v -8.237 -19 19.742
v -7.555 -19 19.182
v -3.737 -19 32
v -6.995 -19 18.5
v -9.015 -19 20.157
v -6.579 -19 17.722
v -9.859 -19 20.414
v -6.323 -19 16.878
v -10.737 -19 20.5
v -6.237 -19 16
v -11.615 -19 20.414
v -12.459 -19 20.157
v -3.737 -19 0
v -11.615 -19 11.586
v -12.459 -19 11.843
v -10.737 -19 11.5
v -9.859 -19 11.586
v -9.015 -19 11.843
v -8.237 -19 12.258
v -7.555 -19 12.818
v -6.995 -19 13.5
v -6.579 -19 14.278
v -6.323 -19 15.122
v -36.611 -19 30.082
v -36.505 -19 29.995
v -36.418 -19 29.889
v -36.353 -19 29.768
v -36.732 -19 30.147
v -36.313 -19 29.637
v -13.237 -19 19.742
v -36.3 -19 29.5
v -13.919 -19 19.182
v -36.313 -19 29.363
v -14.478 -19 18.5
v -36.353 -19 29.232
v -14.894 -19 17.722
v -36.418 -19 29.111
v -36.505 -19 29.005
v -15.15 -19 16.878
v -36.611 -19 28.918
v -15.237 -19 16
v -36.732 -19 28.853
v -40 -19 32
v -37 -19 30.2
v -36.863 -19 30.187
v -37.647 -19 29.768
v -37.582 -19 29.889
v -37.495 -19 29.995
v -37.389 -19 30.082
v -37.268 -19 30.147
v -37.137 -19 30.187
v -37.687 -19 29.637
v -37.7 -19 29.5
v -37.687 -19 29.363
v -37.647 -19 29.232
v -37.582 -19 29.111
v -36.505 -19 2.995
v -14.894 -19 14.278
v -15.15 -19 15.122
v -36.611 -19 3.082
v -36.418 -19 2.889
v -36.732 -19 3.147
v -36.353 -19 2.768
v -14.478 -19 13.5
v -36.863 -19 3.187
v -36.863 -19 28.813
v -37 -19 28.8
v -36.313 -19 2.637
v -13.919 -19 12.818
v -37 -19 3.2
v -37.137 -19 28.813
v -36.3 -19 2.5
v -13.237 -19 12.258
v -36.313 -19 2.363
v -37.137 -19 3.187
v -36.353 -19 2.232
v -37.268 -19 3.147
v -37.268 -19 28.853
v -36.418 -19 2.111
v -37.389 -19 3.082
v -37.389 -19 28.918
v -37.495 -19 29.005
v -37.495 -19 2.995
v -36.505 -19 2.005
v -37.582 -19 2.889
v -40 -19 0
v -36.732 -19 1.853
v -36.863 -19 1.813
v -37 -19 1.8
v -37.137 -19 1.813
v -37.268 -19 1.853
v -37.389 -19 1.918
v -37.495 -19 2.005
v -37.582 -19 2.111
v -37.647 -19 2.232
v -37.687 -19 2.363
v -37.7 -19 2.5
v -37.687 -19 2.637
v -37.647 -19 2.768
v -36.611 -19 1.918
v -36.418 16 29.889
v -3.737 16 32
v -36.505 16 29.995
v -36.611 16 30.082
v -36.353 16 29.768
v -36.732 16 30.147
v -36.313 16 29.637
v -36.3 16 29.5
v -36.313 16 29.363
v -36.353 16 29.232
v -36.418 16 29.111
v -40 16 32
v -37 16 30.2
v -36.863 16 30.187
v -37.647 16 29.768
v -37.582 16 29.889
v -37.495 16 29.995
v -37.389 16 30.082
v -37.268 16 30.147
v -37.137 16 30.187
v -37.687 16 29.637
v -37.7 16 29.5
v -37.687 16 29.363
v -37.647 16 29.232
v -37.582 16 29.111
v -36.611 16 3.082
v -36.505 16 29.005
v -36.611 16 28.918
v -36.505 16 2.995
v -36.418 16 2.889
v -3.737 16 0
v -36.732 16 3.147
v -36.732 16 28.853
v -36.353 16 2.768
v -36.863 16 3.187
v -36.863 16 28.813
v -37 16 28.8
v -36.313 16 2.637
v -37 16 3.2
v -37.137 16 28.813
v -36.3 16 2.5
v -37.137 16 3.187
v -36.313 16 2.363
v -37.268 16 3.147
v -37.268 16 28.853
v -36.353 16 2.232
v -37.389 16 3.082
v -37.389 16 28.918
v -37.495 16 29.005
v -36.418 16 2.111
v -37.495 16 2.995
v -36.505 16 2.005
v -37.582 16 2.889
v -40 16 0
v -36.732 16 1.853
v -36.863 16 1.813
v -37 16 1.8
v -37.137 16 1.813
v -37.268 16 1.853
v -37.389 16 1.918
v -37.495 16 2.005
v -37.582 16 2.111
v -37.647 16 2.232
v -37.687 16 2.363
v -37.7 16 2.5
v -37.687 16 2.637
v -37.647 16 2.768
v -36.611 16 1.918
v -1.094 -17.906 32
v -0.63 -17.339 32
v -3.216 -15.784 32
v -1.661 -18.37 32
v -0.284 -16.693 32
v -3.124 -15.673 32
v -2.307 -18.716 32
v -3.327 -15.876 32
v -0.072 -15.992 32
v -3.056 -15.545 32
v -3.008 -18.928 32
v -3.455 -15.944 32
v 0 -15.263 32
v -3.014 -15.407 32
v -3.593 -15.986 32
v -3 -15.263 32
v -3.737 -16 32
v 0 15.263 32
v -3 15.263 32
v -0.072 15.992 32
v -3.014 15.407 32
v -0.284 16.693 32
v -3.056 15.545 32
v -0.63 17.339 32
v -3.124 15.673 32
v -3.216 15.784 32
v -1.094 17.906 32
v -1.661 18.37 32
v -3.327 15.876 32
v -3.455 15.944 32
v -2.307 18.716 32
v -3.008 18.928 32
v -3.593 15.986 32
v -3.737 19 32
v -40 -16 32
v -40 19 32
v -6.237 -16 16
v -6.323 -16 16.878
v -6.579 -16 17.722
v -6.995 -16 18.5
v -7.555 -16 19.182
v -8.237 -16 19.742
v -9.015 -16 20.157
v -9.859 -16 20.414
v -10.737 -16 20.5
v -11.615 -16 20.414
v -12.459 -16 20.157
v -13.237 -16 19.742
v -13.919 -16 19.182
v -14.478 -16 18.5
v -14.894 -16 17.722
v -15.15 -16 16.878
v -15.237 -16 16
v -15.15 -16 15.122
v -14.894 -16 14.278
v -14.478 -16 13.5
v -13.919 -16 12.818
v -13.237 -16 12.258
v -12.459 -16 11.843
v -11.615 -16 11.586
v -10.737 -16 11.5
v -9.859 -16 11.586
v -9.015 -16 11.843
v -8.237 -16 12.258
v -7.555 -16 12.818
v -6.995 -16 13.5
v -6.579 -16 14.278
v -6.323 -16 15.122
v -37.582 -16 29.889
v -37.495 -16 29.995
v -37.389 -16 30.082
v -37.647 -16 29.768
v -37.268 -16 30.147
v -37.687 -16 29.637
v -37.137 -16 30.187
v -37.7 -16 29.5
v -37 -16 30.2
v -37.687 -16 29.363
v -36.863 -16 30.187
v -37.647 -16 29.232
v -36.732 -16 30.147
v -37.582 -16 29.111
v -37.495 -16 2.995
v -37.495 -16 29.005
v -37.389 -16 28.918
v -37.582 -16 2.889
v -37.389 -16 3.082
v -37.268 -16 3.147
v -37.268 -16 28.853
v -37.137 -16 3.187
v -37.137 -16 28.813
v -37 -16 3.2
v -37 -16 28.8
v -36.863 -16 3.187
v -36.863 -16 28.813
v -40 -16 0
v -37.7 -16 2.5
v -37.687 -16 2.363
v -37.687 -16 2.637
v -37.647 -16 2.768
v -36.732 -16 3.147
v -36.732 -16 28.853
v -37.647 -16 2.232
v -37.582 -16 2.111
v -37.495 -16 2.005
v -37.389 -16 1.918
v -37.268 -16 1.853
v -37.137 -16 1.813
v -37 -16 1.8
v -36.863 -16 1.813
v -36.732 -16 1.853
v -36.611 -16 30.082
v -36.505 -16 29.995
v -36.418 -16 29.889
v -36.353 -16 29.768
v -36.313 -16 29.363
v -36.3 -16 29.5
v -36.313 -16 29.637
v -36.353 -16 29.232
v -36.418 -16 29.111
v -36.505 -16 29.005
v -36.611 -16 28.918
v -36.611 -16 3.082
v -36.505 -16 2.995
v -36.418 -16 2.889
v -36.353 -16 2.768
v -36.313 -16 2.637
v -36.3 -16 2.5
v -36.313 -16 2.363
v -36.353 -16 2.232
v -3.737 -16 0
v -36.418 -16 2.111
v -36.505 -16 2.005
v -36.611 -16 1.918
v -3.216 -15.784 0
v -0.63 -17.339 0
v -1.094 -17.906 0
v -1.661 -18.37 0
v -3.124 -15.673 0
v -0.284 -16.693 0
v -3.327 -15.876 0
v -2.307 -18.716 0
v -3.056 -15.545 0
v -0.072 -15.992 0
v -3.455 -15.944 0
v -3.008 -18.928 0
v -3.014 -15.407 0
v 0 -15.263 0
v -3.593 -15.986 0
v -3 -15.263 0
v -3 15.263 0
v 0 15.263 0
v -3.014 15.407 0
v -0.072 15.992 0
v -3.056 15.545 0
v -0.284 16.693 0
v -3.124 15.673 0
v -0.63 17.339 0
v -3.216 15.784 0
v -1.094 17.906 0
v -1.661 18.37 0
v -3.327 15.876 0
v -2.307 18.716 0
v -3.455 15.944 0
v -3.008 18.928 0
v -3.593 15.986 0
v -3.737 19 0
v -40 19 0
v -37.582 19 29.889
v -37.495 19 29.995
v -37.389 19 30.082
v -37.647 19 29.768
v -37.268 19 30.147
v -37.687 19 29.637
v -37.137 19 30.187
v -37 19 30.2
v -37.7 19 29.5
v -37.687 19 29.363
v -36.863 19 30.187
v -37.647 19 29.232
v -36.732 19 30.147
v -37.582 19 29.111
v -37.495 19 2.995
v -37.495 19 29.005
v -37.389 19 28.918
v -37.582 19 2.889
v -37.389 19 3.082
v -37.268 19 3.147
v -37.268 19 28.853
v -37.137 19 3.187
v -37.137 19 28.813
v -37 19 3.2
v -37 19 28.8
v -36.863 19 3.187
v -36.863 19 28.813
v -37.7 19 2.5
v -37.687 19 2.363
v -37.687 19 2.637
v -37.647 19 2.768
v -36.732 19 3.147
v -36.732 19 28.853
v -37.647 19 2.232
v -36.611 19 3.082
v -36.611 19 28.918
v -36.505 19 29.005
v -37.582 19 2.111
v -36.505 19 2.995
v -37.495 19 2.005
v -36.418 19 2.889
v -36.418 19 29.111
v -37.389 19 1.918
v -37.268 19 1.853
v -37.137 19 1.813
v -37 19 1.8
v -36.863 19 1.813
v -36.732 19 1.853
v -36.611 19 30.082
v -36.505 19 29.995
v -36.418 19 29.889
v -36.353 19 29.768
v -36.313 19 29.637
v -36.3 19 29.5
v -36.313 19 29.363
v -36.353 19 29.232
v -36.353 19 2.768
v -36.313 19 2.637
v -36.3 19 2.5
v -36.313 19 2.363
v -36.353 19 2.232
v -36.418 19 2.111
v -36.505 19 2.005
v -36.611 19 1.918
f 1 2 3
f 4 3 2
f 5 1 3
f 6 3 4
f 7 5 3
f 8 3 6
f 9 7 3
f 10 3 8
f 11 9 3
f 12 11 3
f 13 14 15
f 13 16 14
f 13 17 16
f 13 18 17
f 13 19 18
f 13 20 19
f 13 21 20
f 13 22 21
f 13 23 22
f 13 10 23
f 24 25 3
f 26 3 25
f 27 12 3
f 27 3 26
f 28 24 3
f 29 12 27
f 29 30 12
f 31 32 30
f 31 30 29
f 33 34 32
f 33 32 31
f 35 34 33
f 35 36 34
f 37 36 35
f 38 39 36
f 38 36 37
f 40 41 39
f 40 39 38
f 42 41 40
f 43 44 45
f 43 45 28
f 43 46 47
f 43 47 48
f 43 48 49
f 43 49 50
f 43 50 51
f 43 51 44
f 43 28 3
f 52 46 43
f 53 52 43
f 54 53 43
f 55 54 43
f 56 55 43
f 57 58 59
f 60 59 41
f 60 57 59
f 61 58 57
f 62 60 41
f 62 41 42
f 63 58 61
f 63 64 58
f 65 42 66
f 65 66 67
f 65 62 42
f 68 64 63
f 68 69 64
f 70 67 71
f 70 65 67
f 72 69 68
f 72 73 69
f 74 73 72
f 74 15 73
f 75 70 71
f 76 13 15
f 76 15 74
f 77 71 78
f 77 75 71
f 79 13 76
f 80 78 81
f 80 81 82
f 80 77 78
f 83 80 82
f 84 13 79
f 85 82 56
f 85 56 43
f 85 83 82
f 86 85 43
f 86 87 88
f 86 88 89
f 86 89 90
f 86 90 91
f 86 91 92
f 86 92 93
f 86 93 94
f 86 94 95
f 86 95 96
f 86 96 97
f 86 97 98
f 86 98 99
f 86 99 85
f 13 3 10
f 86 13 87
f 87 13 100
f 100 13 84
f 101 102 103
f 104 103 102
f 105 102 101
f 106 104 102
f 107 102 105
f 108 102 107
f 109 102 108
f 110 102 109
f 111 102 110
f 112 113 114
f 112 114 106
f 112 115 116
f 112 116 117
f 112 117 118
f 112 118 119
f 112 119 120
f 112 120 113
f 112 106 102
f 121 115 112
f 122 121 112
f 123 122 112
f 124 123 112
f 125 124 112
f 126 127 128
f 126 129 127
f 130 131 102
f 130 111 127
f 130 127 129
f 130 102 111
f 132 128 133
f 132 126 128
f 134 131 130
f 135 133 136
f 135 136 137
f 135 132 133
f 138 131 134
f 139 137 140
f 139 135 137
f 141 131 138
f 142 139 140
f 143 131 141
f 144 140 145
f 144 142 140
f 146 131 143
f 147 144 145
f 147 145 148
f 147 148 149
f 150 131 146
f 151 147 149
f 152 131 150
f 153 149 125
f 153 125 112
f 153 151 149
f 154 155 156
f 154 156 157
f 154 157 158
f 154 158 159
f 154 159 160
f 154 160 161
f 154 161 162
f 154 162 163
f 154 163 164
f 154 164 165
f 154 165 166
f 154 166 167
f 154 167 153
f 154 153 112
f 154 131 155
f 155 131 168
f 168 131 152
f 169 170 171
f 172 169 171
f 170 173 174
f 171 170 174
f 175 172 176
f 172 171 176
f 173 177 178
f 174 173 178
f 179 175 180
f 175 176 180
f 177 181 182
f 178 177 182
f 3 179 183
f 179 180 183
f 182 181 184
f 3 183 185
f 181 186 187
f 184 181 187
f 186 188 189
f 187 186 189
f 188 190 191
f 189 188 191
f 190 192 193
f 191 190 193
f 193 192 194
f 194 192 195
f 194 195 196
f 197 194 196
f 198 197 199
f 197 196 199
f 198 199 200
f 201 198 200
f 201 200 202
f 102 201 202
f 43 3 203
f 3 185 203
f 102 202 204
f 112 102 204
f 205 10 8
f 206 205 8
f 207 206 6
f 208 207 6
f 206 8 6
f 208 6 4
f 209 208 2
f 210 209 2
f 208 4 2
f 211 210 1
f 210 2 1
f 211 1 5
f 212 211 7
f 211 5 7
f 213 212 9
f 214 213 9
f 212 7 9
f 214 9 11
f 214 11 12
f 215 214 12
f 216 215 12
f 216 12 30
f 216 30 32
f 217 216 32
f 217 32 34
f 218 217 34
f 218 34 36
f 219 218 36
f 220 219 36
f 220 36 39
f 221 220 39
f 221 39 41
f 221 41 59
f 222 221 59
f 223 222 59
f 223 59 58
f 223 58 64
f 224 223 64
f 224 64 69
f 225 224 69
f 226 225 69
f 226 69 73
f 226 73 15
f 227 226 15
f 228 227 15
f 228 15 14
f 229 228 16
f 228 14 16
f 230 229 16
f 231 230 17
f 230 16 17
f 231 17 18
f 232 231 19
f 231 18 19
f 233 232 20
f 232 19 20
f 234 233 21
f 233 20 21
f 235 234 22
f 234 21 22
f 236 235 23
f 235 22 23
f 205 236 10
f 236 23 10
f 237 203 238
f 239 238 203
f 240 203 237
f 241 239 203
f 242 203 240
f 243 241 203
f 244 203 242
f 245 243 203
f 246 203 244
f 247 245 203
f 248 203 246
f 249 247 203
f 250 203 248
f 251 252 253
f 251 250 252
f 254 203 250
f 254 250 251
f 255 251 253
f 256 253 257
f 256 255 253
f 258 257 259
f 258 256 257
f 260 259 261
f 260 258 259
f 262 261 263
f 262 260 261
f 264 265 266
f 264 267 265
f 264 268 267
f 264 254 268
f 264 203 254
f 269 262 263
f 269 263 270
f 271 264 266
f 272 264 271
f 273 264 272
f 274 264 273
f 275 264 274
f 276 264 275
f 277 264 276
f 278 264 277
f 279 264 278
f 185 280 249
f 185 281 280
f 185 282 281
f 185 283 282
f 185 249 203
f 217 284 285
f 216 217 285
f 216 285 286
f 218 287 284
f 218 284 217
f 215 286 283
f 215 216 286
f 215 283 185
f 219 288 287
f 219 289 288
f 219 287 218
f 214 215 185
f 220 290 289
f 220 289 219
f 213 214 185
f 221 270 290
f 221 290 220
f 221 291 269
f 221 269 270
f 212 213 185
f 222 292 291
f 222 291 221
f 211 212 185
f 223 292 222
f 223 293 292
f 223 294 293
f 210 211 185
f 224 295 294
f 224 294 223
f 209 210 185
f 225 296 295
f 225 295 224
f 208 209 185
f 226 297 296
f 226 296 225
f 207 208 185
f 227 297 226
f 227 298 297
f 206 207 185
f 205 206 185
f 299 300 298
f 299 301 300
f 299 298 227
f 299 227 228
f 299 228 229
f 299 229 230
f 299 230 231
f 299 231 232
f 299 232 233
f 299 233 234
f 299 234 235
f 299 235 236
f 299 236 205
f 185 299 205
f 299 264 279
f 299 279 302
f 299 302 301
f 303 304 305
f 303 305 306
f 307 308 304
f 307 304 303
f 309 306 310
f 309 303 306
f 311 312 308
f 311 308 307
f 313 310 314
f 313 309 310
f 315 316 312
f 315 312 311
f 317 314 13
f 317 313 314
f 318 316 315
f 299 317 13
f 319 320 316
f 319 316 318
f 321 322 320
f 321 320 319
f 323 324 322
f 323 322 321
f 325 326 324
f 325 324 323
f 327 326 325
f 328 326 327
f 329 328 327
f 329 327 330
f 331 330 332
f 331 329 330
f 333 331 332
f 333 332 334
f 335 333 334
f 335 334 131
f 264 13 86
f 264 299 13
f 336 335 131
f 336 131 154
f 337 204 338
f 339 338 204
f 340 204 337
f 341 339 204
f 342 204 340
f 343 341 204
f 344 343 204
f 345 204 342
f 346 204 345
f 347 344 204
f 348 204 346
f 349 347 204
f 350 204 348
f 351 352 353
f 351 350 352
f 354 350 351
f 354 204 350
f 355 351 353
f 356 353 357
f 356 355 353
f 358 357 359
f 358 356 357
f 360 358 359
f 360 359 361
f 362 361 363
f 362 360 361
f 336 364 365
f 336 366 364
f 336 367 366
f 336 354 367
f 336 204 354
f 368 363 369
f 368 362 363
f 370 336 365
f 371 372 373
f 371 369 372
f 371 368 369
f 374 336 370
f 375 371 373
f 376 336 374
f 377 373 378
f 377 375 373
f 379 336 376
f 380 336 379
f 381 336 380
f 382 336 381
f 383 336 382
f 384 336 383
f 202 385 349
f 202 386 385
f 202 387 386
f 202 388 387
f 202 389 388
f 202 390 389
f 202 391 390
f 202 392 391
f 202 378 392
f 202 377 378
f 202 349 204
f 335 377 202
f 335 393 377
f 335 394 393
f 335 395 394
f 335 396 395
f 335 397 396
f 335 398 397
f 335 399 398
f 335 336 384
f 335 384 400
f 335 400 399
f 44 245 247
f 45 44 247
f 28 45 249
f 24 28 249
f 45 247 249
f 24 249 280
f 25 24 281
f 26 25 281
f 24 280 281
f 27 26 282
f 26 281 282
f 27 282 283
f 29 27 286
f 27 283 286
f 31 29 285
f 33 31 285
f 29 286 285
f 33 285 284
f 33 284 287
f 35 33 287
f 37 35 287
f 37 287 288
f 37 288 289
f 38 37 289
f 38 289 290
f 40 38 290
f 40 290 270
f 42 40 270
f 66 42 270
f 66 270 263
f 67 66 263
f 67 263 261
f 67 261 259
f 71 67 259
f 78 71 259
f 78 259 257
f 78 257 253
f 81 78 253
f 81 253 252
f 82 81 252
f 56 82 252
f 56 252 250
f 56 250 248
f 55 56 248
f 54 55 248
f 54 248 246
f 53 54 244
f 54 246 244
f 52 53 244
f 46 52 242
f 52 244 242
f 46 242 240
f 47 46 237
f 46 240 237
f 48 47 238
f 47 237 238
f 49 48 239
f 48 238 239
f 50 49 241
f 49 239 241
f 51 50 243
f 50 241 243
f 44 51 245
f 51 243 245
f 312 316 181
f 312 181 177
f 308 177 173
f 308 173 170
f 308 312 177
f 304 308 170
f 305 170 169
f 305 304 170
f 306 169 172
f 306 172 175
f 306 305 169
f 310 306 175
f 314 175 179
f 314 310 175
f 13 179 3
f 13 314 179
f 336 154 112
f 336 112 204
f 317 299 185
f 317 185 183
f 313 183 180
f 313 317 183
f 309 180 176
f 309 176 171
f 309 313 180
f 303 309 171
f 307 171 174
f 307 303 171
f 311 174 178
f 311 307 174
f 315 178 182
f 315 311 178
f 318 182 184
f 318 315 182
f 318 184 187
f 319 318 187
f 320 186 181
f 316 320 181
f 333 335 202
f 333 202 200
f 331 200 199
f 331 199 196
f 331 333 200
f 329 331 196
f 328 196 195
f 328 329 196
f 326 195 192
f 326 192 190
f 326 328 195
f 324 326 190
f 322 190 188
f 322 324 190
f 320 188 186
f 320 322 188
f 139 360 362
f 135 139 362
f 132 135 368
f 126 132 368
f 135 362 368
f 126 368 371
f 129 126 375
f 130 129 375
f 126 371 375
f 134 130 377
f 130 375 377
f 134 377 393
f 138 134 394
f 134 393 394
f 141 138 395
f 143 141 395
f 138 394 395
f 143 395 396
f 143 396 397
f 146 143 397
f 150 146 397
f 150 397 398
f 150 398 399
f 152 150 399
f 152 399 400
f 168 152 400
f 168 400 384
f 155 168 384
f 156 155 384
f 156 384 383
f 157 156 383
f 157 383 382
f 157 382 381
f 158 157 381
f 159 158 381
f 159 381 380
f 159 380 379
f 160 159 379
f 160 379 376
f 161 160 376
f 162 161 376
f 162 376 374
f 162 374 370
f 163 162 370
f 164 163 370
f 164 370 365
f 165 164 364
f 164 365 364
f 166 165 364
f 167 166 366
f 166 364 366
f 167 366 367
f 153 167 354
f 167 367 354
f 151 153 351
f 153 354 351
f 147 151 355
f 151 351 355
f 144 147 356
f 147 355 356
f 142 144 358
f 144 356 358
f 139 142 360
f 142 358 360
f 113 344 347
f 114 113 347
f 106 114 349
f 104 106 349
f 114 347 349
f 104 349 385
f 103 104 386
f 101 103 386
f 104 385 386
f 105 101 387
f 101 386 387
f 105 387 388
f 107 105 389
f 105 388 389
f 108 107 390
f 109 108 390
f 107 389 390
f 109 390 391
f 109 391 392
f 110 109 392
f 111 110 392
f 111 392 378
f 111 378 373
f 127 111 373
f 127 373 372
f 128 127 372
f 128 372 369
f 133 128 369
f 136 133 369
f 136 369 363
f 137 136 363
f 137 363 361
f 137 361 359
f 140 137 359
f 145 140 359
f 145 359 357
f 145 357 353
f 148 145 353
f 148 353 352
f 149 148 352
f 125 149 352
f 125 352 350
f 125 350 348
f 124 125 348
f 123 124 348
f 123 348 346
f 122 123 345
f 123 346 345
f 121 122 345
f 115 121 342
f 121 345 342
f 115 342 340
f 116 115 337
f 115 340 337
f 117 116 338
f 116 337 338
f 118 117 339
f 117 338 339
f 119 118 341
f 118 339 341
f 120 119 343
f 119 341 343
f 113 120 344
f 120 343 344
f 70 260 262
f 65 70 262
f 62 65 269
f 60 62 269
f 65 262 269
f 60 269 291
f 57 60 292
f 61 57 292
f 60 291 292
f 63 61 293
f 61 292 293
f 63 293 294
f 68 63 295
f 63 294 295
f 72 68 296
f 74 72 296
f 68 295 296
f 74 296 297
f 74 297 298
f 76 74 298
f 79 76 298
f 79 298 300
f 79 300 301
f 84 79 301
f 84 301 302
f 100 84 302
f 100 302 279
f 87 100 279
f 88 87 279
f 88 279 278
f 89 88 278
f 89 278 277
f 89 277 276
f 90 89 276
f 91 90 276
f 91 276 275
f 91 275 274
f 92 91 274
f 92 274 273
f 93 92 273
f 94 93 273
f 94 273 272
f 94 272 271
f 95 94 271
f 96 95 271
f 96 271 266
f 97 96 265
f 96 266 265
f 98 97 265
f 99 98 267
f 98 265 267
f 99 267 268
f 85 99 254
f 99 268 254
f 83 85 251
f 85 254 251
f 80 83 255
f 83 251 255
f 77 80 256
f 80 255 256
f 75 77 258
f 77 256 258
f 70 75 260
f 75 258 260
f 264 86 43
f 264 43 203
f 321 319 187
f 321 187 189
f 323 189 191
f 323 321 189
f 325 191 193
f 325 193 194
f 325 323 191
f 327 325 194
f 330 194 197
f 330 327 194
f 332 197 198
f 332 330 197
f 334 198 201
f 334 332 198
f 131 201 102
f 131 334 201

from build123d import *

# Parameters (mm, degrees)
T_LE_DE_BASE_PLI_E1_DEPTH = 32
ESQUISSE6_R               = 4.5
ENL_V_MAT_EXTRU_1_DEPTH   = 10
ESQUISSE7_R               = 0.7
ENL_V_MAT_EXTRU_2_DEPTH   = 64.780874876


# Sheet-metal steps are written as plain solids
with BuildPart() as part:
    # Esquisse1 → Tôle de base pliée1 (new body)
    with BuildSketch(Plane.XY):
        with BuildLine():
            Line((-40, 19), (-3.7366, 19))
            ThreePointArc((-3.7366, 19), (-1.094424801, 17.905575199), (0, 15.2634))
            Line((0, 15.2634), (0, -15.2634))
            ThreePointArc((0, -15.2634), (-1.094424801, -17.905575199), (-3.7366, -19))
            Line((-3.7366, -19), (-40, -19))
            Line((-40, -19), (-40, -16))
            Line((-40, -16), (-3.7366, -16))
            ThreePointArc((-3.7366, -16), (-3.215745145, -15.784254855), (-3, -15.2634))
            Line((-3, -15.2634), (-3, 15.2634))
            ThreePointArc((-3, 15.2634), (-3.215745145, 15.784254855), (-3.7366, 16))
            Line((-3.7366, 16), (-40, 16))
            Line((-40, 16), (-40, 19))
        make_face()
    extrude(amount=T_LE_DE_BASE_PLI_E1_DEPTH)

    # Esquisse6 → Enlèv. mat.-Extru.1 (cut)
    with BuildSketch(Plane.XZ.offset(19)):
        with Locations((-10.7366, 16)):
            Circle(ESQUISSE6_R)
    extrude(amount=-ENL_V_MAT_EXTRU_1_DEPTH, mode=Mode.SUBTRACT)

    # Esquisse7 → Enlèv. mat.-Extru.2 (cut, through all)
    with BuildSketch(Plane(origin=(0, 19, 0), x_dir=(1, 0, 0), z_dir=(0, 1, 0))):
        with Locations(Location((-37, -29.5, 0), (0, 0, 270))):
            Circle(ESQUISSE7_R)
        with Locations(Location((-37, -2.5, 0), (0, 0, 270))):
            Circle(ESQUISSE7_R)
    extrude(amount=-ENL_V_MAT_EXTRU_2_DEPTH, mode=Mode.SUBTRACT)


solid = part.part
